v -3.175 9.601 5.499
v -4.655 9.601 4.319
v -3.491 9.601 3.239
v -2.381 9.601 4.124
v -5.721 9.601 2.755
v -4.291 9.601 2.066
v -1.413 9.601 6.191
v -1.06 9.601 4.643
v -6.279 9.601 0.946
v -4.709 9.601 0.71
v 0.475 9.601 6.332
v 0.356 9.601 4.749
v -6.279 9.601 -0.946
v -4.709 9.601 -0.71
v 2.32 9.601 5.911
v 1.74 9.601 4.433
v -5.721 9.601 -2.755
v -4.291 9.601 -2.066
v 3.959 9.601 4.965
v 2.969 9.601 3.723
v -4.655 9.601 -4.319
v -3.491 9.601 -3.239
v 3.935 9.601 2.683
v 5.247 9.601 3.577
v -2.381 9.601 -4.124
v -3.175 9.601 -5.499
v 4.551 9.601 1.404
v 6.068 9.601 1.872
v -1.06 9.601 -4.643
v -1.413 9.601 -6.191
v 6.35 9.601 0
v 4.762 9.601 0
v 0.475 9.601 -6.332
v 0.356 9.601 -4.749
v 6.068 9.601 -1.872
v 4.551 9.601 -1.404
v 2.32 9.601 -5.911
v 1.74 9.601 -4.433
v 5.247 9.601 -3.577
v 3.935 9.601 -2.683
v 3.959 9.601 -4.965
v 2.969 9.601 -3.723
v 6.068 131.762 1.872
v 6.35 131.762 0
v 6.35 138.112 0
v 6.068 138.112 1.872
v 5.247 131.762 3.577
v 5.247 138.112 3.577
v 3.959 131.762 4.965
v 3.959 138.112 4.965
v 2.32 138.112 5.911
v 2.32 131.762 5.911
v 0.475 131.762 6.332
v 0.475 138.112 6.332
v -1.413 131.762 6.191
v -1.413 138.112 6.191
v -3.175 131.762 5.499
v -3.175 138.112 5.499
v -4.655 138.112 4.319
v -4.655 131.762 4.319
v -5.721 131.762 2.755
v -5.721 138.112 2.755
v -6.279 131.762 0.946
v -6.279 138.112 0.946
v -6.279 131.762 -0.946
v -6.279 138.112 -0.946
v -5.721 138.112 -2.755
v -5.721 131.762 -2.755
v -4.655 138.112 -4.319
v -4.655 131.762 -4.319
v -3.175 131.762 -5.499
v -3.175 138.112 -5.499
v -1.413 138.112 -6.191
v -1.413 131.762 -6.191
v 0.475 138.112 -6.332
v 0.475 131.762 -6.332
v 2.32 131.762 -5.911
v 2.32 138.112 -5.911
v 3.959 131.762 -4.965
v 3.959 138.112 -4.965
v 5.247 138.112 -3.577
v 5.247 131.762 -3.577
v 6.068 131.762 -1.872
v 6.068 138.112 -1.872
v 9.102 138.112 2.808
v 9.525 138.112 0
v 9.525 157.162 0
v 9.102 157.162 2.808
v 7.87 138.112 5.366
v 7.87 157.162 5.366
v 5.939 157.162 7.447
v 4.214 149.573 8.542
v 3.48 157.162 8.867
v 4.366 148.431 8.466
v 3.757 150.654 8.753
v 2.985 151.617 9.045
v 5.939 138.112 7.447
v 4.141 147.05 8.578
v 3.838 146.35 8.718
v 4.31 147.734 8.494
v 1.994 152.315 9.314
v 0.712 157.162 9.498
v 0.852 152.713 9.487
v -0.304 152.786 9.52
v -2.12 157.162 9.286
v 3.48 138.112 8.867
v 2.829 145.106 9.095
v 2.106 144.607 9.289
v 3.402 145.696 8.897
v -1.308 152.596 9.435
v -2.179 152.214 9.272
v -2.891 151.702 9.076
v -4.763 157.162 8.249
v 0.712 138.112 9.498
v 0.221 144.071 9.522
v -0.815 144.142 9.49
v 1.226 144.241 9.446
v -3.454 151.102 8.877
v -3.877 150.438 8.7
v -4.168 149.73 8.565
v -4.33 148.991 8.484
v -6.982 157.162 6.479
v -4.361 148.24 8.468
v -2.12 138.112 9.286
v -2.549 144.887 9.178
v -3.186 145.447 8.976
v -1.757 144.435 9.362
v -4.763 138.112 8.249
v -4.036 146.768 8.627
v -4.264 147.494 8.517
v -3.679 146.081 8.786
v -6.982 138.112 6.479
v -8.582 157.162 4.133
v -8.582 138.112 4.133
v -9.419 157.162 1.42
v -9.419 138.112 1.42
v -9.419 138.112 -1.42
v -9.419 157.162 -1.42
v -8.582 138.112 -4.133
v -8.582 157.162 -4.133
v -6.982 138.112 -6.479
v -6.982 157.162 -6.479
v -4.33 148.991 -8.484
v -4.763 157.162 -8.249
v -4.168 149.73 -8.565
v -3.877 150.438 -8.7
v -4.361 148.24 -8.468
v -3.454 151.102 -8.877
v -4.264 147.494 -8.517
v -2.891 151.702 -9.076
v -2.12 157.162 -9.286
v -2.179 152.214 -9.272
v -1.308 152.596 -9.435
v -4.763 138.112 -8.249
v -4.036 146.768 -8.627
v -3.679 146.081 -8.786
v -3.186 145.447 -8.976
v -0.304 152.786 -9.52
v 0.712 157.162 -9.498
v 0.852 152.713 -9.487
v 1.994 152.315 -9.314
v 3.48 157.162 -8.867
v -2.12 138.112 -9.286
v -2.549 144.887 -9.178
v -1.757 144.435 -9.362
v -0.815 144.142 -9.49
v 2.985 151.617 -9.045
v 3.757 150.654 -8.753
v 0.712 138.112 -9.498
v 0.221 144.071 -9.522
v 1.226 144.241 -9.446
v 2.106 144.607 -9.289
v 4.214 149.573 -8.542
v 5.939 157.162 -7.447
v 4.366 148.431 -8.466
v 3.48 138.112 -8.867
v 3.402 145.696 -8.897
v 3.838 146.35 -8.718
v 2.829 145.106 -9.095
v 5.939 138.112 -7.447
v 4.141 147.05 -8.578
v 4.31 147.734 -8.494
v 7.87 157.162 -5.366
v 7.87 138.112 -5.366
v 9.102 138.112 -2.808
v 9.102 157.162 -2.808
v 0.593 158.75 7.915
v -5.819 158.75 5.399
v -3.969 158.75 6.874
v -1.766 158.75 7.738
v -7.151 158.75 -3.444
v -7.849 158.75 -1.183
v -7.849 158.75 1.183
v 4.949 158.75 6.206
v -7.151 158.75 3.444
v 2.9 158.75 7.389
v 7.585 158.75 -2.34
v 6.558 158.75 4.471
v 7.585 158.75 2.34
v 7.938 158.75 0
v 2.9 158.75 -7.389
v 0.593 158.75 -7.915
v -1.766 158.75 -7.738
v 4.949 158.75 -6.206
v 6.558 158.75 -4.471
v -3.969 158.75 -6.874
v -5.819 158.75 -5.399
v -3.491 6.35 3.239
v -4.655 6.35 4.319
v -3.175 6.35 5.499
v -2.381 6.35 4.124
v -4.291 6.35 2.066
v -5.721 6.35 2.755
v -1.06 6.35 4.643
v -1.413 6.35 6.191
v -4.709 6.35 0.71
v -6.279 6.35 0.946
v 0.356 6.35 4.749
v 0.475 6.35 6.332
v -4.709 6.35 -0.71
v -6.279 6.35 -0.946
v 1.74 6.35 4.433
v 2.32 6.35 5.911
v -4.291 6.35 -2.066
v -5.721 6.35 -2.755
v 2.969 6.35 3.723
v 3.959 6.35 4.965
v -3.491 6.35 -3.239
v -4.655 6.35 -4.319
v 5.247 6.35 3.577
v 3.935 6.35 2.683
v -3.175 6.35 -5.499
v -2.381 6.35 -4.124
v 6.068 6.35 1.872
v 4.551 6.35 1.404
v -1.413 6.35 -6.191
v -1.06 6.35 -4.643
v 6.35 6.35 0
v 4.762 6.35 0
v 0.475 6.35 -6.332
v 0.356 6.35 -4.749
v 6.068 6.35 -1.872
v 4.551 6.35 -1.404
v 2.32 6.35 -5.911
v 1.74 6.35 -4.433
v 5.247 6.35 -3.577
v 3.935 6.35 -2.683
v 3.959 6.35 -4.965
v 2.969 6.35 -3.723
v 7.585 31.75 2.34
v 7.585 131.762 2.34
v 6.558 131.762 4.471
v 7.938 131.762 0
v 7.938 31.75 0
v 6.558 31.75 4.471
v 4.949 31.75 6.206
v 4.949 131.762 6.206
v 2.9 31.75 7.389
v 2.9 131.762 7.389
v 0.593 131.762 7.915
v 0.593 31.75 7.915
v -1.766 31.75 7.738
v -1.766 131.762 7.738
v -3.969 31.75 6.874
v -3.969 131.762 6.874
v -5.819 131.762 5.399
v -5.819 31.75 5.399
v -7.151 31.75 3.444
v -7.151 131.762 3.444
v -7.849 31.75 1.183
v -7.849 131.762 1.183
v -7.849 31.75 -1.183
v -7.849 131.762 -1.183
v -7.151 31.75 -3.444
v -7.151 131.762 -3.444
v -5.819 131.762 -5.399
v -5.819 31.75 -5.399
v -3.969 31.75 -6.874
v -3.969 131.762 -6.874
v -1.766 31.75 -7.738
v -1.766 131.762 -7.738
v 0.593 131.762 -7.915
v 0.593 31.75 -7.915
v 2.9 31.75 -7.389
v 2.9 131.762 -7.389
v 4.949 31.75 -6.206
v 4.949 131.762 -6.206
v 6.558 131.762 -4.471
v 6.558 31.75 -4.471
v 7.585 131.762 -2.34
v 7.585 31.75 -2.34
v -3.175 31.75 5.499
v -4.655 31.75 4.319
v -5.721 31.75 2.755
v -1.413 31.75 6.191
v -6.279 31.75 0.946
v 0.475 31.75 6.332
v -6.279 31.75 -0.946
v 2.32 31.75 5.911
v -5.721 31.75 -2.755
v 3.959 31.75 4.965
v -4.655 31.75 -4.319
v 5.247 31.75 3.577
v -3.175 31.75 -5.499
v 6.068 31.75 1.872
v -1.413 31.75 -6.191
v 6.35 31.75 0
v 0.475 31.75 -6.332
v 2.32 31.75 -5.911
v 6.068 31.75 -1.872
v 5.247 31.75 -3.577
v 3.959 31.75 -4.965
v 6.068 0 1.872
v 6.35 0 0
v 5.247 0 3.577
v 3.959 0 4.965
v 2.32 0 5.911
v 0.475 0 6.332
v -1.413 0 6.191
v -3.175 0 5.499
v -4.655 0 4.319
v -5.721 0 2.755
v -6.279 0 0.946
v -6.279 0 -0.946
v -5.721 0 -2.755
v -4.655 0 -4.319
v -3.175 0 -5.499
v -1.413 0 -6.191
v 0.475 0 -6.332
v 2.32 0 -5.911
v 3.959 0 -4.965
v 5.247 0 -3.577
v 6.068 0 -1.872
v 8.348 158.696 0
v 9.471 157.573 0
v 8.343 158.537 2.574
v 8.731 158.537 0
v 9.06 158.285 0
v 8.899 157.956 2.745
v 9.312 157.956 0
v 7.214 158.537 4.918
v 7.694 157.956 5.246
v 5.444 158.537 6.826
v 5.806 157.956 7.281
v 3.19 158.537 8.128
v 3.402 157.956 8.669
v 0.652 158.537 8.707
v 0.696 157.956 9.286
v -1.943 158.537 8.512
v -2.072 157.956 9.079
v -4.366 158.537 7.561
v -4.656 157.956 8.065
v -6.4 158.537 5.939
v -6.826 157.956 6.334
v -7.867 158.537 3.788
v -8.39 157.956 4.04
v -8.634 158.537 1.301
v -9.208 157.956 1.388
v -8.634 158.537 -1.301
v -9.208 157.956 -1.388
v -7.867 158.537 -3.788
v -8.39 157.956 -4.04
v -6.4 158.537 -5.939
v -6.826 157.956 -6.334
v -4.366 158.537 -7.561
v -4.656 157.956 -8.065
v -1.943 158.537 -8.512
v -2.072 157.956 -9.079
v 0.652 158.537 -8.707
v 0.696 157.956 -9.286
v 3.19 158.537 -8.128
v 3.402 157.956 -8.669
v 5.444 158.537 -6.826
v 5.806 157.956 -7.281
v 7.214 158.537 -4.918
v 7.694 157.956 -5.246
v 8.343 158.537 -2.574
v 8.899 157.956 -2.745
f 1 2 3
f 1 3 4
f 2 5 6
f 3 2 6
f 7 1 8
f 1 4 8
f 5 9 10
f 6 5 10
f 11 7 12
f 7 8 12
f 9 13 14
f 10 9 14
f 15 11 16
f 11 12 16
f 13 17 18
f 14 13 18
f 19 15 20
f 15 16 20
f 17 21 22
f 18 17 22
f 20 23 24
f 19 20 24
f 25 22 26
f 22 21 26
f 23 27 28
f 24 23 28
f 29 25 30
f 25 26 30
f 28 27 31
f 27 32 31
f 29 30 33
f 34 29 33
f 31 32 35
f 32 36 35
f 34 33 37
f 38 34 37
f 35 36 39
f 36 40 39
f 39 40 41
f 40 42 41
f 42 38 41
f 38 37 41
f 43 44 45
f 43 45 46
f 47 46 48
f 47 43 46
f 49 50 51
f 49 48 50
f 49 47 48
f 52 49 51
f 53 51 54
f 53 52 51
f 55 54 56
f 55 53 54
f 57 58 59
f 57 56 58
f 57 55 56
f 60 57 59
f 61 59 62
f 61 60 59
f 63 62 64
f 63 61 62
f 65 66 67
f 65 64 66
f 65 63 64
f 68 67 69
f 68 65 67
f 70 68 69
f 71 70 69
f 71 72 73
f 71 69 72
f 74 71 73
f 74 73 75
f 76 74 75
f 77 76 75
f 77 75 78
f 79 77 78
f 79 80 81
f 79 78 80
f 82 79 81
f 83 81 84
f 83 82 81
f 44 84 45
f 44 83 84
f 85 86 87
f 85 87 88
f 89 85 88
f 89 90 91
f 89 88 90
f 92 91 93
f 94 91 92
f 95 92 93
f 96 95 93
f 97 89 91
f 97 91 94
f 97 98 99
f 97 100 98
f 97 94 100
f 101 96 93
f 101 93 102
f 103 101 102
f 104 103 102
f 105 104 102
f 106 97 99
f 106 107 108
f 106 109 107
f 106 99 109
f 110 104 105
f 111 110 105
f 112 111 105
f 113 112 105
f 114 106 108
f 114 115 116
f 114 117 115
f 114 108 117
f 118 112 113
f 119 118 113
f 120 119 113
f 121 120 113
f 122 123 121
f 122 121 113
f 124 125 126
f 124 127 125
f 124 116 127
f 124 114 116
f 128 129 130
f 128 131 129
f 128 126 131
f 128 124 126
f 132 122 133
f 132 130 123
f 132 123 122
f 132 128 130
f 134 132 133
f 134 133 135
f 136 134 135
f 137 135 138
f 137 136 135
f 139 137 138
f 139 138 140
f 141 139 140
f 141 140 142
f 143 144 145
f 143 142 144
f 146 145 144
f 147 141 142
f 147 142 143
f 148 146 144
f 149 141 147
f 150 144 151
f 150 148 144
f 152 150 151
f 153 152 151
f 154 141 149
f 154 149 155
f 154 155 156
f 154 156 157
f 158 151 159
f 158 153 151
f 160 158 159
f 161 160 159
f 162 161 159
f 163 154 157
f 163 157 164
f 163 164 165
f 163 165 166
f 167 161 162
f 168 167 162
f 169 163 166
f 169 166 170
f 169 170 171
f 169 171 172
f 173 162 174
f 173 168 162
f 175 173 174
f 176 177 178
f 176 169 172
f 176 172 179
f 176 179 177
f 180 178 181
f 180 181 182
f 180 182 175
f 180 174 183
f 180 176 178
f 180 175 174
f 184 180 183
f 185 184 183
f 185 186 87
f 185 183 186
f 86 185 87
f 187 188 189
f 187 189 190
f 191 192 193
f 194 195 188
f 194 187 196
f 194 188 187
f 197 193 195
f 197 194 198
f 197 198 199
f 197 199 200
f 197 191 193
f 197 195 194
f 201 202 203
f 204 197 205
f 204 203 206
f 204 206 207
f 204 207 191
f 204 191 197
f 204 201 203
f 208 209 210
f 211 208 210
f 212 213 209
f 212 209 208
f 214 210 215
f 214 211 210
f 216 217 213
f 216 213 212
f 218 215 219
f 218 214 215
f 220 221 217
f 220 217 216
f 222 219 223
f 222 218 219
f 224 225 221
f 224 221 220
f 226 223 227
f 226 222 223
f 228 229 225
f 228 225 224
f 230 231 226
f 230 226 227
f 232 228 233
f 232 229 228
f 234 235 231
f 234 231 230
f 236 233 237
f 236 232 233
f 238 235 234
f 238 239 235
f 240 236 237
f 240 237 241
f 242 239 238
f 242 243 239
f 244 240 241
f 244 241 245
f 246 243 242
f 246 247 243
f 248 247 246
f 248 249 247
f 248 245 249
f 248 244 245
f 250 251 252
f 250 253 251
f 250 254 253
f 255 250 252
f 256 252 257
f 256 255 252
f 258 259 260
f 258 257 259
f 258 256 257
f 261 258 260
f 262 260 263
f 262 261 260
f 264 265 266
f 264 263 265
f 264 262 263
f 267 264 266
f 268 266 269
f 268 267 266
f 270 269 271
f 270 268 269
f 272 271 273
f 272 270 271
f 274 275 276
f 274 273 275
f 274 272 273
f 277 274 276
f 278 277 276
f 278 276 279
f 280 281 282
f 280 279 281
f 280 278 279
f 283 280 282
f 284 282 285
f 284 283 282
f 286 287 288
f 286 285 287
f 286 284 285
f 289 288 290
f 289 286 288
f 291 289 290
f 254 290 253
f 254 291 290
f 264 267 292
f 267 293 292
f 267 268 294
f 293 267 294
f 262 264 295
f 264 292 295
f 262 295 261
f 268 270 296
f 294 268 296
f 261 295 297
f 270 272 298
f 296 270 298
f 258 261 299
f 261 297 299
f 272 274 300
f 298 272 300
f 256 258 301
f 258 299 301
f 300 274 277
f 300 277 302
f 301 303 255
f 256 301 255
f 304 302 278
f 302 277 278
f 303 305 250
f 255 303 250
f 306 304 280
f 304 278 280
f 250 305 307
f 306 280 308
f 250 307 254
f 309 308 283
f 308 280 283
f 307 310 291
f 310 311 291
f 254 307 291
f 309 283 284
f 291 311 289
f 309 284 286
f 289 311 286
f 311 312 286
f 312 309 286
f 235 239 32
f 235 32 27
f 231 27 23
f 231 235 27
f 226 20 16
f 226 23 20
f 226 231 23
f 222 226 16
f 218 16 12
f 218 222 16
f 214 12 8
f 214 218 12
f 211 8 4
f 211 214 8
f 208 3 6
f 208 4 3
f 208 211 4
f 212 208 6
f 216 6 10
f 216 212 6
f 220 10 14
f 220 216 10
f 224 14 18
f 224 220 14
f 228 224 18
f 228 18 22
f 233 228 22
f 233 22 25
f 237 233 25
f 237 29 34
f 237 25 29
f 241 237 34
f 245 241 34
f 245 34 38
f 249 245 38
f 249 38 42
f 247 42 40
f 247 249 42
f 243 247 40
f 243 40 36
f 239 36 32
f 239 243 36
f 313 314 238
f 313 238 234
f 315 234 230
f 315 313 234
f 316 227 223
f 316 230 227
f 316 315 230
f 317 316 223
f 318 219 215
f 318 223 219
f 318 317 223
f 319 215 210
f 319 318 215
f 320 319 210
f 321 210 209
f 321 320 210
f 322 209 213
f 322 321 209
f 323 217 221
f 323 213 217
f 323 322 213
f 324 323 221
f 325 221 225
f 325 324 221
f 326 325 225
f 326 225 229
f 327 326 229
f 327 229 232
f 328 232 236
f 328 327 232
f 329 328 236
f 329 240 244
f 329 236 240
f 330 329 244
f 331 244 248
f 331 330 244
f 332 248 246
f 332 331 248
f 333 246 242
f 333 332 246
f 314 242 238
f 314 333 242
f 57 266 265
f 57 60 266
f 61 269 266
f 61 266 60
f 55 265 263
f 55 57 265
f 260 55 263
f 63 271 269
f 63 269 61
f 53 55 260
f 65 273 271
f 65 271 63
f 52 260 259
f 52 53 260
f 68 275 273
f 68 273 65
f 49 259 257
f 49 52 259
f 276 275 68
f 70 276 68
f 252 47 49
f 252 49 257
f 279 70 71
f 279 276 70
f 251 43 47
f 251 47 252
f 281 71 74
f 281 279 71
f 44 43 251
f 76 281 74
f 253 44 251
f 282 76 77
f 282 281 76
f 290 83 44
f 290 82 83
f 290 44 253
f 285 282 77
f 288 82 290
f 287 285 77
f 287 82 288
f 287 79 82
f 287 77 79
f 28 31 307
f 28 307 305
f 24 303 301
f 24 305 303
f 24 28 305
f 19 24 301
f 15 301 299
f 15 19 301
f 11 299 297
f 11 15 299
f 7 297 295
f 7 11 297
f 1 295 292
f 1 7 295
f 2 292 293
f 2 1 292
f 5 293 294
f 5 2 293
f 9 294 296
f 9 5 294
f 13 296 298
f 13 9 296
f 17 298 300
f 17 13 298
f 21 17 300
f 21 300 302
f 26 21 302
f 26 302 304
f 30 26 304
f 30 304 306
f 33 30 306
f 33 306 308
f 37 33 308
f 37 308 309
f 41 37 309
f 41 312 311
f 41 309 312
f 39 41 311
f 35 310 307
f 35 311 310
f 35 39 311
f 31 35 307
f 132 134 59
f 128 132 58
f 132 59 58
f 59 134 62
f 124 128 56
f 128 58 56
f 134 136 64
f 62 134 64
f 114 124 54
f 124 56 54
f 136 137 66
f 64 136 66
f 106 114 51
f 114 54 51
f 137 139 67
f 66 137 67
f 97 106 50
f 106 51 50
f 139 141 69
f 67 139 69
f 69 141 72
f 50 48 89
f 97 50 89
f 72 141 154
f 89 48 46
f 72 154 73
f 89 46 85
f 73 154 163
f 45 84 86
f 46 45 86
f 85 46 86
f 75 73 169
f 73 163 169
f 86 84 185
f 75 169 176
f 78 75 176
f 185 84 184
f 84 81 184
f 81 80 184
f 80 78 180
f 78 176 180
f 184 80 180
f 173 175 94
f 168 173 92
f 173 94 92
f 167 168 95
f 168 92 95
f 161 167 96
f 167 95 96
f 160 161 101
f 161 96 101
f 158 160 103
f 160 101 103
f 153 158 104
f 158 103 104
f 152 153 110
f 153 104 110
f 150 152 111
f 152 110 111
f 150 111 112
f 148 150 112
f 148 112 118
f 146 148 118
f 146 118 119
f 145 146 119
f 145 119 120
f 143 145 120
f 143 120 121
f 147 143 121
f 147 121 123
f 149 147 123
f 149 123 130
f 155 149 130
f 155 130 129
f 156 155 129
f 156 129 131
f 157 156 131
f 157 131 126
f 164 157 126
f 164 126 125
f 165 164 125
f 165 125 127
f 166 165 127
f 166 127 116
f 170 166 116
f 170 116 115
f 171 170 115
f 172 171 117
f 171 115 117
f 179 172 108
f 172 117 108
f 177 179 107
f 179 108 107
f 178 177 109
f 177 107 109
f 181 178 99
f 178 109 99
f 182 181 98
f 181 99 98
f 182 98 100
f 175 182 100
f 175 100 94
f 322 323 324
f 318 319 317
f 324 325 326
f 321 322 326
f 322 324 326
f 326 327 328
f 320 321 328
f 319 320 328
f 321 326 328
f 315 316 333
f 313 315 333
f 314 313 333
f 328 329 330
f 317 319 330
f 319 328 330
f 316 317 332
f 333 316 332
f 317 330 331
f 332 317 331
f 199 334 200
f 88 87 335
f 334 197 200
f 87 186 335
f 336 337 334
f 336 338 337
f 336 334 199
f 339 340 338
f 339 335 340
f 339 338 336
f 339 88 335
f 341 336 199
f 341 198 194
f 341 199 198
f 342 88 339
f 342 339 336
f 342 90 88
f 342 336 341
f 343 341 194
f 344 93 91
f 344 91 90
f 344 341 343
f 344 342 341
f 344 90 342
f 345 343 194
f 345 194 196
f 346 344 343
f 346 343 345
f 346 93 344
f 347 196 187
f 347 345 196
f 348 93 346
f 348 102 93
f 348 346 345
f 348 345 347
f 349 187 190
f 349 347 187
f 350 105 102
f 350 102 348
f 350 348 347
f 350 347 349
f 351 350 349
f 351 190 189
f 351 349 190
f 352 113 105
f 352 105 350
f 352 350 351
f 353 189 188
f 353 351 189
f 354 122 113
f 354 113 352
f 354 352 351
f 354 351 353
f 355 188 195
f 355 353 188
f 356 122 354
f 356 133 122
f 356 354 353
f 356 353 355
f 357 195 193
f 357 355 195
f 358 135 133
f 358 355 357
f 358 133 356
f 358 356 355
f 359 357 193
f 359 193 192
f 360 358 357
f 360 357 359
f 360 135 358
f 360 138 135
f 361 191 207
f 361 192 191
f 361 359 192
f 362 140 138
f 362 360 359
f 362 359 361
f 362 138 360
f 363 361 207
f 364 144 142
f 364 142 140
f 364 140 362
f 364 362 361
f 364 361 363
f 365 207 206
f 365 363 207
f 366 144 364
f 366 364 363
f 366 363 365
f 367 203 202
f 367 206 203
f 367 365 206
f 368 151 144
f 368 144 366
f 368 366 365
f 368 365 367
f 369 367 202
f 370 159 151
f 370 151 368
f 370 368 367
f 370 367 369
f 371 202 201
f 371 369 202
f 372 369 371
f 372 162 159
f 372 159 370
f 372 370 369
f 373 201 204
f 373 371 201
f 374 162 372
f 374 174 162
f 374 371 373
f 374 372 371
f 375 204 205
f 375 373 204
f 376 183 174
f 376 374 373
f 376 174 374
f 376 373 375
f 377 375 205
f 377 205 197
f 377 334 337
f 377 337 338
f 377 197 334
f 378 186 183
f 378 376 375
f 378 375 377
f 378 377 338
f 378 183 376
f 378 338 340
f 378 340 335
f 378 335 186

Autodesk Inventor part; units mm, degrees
ref_plane "YZ Plane" through (0, 0, 0) normal (1, 0, 0) x (0, 1, 0)
ref_plane "XZ Plane" through (0, 0, 0) normal (0, 1, 0) x (-1, 0, 0)
ref_plane "XY Plane" through (0, 0, 0) normal (0, 0, 1) x (1, 0, 0)
sketch "Sketch1" plane through (0, 0, 0) normal (0, 0, 1) x (1, 0, 0)
  line L0 (0, 158.75) -> (9.525, 158.75)
  line L1 (9.525, 158.75) -> (9.525, 138.1125)
  line L2 (9.525, 138.1125) -> (6.35, 138.1125)
  line L3 (6.35, 138.1125) -> (6.35, 131.7625)
  line L4 (6.35, 131.7625) -> (7.9375, 131.7625)
  line L5 (7.9375, 131.7625) -> (7.9375, 31.75)
  line L6 (7.9375, 31.75) -> (6.35, 31.75)
  line L7 (6.35, 31.75) -> (6.35, 9.6012)
  line L8 (6.35, 9.6012) -> (4.7625, 9.6012)
  line L9 (4.7625, 9.6012) -> (4.7625, 6.35)
  line L10 (4.7625, 6.35) -> (6.35, 6.35)
  line L11 (6.35, 6.35) -> (6.35, 0)
  line L12 (6.35, 0) -> (0, 0)
  line L13 (0, 0) -> (0, 158.75)
  dimension "d0" = 12.7
  dimension "d1" = 9.525
  dimension "d3" = 12.7
  dimension "d4" = 15.875
  dimension "d5" = 12.7
  dimension "d6" = 19.05
  dimension "d7" = 20.6375
  dimension "d8" = 6.35
  dimension "d9" = 100.0125
  dimension "d10" = 6.35
  dimension "d11" = 3.2512
  dimension "d12" = 158.75
revolve "Revolution1" add sketch "Sketch1" angle 360 about axis through (0, 0, 0) along (0, 1, 0)
thread "Thread1" size "5/8-8 Acme" class "2G" standard "ACME" full length
sketch "Sketch2" plane through (0, 0, 0) normal (0, 0, 1) x (1, 0, 0)
  line L0 (-9.525, 158.75) -> (9.525, 158.75) projected
  circle A0 centre (0, 148.4313) radius 4.3656
  point P0 (0, 158.75)
  dimension "d16" = 8.7312
  dimension "d17" = 10.3187
extrude "Extrusion1" cut sketch "Sketch2" along normal through all both and the other way through all
fillet "Fillet1" radius 1.5875 1 edges at (-9.525, 158.75, 0)
properties part number "Vise_Screw" material "Steel, Mild"
